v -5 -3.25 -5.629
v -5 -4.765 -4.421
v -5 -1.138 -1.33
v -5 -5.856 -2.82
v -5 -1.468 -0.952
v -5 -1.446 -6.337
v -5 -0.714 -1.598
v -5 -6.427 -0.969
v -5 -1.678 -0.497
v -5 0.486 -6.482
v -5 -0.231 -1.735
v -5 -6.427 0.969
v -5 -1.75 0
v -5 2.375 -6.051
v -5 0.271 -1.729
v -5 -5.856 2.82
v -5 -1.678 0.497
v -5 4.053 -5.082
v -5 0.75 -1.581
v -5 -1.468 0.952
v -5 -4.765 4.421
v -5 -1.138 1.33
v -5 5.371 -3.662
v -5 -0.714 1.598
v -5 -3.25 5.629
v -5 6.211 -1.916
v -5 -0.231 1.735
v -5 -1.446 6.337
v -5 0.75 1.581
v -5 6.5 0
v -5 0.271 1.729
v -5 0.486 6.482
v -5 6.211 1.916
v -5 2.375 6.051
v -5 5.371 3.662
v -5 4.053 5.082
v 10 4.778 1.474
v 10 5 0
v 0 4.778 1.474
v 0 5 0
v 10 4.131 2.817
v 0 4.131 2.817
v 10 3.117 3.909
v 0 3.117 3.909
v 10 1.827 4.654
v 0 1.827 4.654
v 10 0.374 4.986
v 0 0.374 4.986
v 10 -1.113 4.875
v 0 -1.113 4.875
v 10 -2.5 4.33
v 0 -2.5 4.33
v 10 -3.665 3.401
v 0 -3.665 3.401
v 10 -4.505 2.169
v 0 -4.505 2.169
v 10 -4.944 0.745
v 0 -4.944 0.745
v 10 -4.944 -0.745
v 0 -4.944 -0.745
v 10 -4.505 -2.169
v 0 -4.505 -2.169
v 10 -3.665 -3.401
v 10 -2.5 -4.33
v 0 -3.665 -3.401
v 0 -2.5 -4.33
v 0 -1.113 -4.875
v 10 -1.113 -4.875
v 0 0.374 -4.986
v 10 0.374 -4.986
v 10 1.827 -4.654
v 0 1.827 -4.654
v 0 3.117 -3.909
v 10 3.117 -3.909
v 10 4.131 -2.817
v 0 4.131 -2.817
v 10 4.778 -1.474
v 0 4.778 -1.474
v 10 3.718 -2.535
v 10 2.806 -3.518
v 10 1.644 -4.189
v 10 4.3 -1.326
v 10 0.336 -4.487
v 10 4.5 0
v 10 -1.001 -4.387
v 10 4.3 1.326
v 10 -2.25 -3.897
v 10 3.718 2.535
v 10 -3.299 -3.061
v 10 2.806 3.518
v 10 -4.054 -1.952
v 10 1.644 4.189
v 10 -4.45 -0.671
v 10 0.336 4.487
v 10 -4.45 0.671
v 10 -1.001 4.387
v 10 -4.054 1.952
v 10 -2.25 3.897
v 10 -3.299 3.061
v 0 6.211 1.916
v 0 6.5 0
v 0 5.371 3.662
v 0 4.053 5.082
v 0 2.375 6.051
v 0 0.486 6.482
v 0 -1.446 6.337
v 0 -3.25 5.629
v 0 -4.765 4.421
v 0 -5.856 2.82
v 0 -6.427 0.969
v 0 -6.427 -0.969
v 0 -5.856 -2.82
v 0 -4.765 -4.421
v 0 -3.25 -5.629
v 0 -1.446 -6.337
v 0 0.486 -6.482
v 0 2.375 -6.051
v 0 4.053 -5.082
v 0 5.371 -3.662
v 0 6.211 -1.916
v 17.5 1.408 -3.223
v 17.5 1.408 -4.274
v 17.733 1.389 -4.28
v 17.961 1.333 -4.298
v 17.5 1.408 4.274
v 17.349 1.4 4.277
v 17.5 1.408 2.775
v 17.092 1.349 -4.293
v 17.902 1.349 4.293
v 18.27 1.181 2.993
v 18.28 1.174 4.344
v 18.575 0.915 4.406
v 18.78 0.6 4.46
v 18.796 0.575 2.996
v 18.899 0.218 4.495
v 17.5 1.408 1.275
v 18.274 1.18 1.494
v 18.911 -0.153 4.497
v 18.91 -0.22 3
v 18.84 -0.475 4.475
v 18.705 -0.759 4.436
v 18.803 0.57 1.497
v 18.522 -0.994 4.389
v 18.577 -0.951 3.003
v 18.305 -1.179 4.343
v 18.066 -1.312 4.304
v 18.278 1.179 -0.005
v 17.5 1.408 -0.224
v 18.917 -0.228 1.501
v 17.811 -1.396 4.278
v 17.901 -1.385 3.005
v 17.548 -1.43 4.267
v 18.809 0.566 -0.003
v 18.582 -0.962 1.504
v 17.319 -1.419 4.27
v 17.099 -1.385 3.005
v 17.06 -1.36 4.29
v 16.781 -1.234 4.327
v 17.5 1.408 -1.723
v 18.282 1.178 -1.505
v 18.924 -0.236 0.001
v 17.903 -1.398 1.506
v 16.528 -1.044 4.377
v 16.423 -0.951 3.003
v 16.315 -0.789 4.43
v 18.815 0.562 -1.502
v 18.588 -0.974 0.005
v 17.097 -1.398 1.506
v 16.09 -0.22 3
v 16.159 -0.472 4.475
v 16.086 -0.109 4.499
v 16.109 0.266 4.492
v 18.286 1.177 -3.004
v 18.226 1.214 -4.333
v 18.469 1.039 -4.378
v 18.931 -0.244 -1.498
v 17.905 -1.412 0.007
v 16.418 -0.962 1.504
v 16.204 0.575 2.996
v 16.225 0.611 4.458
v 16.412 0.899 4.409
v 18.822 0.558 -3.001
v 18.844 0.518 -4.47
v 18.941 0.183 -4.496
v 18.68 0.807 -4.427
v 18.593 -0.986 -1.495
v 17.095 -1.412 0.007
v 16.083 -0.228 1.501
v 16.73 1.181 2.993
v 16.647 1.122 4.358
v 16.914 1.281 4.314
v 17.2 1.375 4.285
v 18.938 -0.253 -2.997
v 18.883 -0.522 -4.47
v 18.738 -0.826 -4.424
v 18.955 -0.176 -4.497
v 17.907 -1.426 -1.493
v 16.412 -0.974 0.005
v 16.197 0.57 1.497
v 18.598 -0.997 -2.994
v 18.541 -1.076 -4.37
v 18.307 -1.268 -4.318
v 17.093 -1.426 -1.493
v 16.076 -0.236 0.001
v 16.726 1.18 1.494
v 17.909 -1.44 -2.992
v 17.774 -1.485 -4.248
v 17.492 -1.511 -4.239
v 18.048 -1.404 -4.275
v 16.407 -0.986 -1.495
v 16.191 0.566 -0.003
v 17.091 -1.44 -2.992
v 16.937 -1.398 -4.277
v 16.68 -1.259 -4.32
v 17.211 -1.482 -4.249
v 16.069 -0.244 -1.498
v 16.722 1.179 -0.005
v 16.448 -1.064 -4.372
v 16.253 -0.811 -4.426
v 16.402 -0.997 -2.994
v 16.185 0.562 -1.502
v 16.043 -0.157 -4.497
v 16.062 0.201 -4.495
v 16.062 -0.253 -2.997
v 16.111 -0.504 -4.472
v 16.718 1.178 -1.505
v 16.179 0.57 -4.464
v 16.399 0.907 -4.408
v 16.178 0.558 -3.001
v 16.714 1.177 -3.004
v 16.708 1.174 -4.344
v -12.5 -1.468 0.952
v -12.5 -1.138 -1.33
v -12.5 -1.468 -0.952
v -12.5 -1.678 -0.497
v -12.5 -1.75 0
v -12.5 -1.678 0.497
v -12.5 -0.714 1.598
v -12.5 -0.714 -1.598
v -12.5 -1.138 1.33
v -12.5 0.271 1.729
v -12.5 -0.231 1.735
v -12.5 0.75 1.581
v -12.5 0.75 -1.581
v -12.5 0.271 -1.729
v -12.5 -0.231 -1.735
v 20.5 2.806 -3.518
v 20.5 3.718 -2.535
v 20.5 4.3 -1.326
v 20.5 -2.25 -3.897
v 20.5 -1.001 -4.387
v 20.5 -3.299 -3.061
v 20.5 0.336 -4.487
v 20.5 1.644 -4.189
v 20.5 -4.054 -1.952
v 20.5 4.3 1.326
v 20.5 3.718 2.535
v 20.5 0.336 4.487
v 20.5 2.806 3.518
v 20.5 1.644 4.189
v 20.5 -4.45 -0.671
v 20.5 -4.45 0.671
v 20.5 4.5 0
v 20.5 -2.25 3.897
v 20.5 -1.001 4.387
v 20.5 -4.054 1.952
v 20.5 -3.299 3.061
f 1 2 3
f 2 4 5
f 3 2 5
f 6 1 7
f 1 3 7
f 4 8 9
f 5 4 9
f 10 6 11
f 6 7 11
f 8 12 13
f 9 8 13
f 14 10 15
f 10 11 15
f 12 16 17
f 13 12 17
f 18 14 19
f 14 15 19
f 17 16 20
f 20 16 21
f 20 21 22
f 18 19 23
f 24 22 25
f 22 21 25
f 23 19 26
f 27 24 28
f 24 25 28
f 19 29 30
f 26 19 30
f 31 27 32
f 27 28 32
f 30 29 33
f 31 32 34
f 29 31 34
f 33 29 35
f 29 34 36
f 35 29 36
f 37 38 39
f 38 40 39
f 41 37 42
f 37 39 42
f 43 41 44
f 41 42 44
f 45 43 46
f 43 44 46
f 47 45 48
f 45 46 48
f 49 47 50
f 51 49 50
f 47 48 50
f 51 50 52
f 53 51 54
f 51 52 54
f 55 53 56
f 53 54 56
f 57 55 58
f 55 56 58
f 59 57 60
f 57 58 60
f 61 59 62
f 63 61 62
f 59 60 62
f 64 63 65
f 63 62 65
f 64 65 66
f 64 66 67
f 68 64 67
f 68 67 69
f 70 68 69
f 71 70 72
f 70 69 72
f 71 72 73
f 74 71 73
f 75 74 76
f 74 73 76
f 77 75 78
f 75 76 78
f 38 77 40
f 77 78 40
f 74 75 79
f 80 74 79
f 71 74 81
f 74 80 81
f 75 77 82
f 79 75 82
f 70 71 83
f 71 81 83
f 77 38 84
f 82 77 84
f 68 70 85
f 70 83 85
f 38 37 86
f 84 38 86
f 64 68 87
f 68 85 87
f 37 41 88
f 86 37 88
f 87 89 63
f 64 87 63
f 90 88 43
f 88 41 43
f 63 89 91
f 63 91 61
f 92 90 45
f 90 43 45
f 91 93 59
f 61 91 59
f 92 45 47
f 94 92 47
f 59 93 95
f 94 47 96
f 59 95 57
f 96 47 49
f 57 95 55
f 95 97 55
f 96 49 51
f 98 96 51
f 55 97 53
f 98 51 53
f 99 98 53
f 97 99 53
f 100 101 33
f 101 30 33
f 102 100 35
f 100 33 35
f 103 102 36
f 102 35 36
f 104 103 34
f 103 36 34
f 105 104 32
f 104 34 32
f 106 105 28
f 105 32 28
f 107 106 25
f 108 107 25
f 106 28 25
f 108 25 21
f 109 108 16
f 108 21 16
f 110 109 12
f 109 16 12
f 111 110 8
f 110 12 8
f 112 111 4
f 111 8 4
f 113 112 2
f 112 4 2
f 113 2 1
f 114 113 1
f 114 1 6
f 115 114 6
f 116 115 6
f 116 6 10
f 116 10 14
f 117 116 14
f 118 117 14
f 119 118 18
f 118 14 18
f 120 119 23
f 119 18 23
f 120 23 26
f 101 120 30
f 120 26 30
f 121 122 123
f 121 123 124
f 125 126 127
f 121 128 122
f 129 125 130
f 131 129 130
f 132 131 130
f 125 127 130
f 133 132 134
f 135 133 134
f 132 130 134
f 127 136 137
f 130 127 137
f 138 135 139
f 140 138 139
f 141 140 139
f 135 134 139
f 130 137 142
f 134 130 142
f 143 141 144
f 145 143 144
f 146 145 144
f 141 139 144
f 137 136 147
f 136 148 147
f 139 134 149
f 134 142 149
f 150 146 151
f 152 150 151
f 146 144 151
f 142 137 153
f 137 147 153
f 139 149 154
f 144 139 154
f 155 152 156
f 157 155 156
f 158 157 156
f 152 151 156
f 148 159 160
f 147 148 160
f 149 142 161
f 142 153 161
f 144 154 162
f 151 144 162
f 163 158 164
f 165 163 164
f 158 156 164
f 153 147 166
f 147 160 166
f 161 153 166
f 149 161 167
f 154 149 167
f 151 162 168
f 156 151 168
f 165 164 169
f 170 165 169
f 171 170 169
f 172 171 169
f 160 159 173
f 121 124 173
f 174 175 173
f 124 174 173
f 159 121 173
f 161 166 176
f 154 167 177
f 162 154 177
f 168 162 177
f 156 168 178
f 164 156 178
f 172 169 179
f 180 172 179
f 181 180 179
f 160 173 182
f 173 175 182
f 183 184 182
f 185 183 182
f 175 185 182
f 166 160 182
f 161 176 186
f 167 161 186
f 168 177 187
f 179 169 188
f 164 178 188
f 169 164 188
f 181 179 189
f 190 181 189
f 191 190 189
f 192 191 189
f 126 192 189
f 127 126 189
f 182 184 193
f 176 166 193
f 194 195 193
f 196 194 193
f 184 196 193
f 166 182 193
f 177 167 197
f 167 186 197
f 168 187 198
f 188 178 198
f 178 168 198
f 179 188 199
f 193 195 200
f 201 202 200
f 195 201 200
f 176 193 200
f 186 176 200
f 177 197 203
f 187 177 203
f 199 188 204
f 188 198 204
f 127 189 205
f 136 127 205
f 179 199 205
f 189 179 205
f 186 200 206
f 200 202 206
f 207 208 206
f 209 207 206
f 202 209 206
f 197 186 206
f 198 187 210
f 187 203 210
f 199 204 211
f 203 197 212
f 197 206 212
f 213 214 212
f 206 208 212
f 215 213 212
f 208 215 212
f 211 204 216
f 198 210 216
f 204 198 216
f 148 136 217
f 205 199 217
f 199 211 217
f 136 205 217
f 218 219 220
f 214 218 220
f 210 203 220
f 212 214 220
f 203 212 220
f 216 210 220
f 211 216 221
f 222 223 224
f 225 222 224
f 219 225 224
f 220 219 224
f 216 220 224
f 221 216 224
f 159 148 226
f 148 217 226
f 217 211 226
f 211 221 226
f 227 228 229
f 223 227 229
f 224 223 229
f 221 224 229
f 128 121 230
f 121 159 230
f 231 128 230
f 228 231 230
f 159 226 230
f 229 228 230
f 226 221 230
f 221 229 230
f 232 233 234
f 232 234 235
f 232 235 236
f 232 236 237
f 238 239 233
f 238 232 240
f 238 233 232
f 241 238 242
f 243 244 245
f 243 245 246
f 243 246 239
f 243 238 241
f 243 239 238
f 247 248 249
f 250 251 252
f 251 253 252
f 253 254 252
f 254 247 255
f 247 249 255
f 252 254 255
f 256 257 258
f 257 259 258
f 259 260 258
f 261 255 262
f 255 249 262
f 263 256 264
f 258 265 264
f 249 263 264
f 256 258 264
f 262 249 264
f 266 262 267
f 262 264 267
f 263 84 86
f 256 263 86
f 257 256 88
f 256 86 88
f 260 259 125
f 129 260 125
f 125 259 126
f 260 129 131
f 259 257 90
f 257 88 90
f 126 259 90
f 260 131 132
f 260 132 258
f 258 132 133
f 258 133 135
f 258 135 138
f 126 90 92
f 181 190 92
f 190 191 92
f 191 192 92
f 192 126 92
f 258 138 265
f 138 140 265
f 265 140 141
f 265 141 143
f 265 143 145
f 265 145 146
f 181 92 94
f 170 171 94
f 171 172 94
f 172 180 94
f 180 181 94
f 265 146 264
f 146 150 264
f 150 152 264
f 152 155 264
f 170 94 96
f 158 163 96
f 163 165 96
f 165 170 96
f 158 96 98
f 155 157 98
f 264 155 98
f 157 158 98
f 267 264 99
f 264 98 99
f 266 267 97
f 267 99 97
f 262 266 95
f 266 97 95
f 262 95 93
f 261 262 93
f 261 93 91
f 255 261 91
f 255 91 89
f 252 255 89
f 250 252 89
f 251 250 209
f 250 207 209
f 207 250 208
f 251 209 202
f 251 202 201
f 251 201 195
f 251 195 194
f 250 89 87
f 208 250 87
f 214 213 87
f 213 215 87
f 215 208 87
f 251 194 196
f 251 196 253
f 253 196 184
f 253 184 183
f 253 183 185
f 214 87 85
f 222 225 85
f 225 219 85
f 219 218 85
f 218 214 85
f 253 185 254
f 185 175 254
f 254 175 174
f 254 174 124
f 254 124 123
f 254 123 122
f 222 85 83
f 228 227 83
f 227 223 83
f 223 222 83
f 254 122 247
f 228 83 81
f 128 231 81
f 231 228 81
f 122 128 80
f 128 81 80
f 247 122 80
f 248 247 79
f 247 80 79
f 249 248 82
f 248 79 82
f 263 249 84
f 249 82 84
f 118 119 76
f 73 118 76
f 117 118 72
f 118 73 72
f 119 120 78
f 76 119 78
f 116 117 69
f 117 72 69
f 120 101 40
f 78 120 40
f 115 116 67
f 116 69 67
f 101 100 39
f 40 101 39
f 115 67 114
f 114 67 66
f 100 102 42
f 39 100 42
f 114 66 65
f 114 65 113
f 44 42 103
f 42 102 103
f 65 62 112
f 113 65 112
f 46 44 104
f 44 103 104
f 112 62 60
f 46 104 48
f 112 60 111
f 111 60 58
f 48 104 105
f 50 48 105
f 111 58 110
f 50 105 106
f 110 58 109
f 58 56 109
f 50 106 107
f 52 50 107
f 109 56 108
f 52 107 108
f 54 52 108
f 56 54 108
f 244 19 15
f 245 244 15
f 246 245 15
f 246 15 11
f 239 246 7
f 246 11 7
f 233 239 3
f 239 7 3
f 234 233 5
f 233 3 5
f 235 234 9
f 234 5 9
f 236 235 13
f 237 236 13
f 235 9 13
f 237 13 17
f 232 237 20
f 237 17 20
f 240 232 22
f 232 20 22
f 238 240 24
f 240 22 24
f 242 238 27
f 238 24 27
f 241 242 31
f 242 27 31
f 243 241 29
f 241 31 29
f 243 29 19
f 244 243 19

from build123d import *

# Parameters (mm, degrees)
EXTRUDE_2_DEPTH = 7.5


with BuildPart() as part:
    # 草图1 → 旋转1 (revolve)
    with BuildSketch(Plane.XY):
        Polygon((-5, 0), (0, 0), (20.5, 0), (20.5, 4.5), (10, 4.5), (10, 5), (0, 5), (0, 6.5), (-5, 6.5), (-5, 5), align=None)
    revolve(axis=Axis((-5, 0, 0), (1, 0, 0)))

    # 草图3 → 切除-旋转1 (revolve, cut)
    with BuildSketch(Plane(origin=(17.5, 0, 0), x_dir=(0, 0, -1), z_dir=(1, 0, 0))):
        Polygon((-6.680542038, 0), (-6.680542038, 1.407519777), (7.599960071, 1.407519777), (7.599960071, -0.067480223), align=None)
    revolve(axis=Axis((17.5, 0, 6.680542038), (0, -0.004725287, -0.999988836)), mode=Mode.SUBTRACT)

    # 草图4 → 凸台-拉伸2 (add)
    with BuildSketch(Plane.ZY.offset(5)):
        with BuildLine():
            Line((0.04652715, 0.75), (0, 0.75))
            Line((0, 0.75), (-1.58113883, 0.75))
            ThreePointArc((-1.58113883, 0.75), (0, -1.75), (1.58113883, 0.75))
            Line((1.58113883, 0.75), (0.04652715, 0.75))
        make_face()
    extrude(amount=EXTRUDE_2_DEPTH)


solid = part.part
